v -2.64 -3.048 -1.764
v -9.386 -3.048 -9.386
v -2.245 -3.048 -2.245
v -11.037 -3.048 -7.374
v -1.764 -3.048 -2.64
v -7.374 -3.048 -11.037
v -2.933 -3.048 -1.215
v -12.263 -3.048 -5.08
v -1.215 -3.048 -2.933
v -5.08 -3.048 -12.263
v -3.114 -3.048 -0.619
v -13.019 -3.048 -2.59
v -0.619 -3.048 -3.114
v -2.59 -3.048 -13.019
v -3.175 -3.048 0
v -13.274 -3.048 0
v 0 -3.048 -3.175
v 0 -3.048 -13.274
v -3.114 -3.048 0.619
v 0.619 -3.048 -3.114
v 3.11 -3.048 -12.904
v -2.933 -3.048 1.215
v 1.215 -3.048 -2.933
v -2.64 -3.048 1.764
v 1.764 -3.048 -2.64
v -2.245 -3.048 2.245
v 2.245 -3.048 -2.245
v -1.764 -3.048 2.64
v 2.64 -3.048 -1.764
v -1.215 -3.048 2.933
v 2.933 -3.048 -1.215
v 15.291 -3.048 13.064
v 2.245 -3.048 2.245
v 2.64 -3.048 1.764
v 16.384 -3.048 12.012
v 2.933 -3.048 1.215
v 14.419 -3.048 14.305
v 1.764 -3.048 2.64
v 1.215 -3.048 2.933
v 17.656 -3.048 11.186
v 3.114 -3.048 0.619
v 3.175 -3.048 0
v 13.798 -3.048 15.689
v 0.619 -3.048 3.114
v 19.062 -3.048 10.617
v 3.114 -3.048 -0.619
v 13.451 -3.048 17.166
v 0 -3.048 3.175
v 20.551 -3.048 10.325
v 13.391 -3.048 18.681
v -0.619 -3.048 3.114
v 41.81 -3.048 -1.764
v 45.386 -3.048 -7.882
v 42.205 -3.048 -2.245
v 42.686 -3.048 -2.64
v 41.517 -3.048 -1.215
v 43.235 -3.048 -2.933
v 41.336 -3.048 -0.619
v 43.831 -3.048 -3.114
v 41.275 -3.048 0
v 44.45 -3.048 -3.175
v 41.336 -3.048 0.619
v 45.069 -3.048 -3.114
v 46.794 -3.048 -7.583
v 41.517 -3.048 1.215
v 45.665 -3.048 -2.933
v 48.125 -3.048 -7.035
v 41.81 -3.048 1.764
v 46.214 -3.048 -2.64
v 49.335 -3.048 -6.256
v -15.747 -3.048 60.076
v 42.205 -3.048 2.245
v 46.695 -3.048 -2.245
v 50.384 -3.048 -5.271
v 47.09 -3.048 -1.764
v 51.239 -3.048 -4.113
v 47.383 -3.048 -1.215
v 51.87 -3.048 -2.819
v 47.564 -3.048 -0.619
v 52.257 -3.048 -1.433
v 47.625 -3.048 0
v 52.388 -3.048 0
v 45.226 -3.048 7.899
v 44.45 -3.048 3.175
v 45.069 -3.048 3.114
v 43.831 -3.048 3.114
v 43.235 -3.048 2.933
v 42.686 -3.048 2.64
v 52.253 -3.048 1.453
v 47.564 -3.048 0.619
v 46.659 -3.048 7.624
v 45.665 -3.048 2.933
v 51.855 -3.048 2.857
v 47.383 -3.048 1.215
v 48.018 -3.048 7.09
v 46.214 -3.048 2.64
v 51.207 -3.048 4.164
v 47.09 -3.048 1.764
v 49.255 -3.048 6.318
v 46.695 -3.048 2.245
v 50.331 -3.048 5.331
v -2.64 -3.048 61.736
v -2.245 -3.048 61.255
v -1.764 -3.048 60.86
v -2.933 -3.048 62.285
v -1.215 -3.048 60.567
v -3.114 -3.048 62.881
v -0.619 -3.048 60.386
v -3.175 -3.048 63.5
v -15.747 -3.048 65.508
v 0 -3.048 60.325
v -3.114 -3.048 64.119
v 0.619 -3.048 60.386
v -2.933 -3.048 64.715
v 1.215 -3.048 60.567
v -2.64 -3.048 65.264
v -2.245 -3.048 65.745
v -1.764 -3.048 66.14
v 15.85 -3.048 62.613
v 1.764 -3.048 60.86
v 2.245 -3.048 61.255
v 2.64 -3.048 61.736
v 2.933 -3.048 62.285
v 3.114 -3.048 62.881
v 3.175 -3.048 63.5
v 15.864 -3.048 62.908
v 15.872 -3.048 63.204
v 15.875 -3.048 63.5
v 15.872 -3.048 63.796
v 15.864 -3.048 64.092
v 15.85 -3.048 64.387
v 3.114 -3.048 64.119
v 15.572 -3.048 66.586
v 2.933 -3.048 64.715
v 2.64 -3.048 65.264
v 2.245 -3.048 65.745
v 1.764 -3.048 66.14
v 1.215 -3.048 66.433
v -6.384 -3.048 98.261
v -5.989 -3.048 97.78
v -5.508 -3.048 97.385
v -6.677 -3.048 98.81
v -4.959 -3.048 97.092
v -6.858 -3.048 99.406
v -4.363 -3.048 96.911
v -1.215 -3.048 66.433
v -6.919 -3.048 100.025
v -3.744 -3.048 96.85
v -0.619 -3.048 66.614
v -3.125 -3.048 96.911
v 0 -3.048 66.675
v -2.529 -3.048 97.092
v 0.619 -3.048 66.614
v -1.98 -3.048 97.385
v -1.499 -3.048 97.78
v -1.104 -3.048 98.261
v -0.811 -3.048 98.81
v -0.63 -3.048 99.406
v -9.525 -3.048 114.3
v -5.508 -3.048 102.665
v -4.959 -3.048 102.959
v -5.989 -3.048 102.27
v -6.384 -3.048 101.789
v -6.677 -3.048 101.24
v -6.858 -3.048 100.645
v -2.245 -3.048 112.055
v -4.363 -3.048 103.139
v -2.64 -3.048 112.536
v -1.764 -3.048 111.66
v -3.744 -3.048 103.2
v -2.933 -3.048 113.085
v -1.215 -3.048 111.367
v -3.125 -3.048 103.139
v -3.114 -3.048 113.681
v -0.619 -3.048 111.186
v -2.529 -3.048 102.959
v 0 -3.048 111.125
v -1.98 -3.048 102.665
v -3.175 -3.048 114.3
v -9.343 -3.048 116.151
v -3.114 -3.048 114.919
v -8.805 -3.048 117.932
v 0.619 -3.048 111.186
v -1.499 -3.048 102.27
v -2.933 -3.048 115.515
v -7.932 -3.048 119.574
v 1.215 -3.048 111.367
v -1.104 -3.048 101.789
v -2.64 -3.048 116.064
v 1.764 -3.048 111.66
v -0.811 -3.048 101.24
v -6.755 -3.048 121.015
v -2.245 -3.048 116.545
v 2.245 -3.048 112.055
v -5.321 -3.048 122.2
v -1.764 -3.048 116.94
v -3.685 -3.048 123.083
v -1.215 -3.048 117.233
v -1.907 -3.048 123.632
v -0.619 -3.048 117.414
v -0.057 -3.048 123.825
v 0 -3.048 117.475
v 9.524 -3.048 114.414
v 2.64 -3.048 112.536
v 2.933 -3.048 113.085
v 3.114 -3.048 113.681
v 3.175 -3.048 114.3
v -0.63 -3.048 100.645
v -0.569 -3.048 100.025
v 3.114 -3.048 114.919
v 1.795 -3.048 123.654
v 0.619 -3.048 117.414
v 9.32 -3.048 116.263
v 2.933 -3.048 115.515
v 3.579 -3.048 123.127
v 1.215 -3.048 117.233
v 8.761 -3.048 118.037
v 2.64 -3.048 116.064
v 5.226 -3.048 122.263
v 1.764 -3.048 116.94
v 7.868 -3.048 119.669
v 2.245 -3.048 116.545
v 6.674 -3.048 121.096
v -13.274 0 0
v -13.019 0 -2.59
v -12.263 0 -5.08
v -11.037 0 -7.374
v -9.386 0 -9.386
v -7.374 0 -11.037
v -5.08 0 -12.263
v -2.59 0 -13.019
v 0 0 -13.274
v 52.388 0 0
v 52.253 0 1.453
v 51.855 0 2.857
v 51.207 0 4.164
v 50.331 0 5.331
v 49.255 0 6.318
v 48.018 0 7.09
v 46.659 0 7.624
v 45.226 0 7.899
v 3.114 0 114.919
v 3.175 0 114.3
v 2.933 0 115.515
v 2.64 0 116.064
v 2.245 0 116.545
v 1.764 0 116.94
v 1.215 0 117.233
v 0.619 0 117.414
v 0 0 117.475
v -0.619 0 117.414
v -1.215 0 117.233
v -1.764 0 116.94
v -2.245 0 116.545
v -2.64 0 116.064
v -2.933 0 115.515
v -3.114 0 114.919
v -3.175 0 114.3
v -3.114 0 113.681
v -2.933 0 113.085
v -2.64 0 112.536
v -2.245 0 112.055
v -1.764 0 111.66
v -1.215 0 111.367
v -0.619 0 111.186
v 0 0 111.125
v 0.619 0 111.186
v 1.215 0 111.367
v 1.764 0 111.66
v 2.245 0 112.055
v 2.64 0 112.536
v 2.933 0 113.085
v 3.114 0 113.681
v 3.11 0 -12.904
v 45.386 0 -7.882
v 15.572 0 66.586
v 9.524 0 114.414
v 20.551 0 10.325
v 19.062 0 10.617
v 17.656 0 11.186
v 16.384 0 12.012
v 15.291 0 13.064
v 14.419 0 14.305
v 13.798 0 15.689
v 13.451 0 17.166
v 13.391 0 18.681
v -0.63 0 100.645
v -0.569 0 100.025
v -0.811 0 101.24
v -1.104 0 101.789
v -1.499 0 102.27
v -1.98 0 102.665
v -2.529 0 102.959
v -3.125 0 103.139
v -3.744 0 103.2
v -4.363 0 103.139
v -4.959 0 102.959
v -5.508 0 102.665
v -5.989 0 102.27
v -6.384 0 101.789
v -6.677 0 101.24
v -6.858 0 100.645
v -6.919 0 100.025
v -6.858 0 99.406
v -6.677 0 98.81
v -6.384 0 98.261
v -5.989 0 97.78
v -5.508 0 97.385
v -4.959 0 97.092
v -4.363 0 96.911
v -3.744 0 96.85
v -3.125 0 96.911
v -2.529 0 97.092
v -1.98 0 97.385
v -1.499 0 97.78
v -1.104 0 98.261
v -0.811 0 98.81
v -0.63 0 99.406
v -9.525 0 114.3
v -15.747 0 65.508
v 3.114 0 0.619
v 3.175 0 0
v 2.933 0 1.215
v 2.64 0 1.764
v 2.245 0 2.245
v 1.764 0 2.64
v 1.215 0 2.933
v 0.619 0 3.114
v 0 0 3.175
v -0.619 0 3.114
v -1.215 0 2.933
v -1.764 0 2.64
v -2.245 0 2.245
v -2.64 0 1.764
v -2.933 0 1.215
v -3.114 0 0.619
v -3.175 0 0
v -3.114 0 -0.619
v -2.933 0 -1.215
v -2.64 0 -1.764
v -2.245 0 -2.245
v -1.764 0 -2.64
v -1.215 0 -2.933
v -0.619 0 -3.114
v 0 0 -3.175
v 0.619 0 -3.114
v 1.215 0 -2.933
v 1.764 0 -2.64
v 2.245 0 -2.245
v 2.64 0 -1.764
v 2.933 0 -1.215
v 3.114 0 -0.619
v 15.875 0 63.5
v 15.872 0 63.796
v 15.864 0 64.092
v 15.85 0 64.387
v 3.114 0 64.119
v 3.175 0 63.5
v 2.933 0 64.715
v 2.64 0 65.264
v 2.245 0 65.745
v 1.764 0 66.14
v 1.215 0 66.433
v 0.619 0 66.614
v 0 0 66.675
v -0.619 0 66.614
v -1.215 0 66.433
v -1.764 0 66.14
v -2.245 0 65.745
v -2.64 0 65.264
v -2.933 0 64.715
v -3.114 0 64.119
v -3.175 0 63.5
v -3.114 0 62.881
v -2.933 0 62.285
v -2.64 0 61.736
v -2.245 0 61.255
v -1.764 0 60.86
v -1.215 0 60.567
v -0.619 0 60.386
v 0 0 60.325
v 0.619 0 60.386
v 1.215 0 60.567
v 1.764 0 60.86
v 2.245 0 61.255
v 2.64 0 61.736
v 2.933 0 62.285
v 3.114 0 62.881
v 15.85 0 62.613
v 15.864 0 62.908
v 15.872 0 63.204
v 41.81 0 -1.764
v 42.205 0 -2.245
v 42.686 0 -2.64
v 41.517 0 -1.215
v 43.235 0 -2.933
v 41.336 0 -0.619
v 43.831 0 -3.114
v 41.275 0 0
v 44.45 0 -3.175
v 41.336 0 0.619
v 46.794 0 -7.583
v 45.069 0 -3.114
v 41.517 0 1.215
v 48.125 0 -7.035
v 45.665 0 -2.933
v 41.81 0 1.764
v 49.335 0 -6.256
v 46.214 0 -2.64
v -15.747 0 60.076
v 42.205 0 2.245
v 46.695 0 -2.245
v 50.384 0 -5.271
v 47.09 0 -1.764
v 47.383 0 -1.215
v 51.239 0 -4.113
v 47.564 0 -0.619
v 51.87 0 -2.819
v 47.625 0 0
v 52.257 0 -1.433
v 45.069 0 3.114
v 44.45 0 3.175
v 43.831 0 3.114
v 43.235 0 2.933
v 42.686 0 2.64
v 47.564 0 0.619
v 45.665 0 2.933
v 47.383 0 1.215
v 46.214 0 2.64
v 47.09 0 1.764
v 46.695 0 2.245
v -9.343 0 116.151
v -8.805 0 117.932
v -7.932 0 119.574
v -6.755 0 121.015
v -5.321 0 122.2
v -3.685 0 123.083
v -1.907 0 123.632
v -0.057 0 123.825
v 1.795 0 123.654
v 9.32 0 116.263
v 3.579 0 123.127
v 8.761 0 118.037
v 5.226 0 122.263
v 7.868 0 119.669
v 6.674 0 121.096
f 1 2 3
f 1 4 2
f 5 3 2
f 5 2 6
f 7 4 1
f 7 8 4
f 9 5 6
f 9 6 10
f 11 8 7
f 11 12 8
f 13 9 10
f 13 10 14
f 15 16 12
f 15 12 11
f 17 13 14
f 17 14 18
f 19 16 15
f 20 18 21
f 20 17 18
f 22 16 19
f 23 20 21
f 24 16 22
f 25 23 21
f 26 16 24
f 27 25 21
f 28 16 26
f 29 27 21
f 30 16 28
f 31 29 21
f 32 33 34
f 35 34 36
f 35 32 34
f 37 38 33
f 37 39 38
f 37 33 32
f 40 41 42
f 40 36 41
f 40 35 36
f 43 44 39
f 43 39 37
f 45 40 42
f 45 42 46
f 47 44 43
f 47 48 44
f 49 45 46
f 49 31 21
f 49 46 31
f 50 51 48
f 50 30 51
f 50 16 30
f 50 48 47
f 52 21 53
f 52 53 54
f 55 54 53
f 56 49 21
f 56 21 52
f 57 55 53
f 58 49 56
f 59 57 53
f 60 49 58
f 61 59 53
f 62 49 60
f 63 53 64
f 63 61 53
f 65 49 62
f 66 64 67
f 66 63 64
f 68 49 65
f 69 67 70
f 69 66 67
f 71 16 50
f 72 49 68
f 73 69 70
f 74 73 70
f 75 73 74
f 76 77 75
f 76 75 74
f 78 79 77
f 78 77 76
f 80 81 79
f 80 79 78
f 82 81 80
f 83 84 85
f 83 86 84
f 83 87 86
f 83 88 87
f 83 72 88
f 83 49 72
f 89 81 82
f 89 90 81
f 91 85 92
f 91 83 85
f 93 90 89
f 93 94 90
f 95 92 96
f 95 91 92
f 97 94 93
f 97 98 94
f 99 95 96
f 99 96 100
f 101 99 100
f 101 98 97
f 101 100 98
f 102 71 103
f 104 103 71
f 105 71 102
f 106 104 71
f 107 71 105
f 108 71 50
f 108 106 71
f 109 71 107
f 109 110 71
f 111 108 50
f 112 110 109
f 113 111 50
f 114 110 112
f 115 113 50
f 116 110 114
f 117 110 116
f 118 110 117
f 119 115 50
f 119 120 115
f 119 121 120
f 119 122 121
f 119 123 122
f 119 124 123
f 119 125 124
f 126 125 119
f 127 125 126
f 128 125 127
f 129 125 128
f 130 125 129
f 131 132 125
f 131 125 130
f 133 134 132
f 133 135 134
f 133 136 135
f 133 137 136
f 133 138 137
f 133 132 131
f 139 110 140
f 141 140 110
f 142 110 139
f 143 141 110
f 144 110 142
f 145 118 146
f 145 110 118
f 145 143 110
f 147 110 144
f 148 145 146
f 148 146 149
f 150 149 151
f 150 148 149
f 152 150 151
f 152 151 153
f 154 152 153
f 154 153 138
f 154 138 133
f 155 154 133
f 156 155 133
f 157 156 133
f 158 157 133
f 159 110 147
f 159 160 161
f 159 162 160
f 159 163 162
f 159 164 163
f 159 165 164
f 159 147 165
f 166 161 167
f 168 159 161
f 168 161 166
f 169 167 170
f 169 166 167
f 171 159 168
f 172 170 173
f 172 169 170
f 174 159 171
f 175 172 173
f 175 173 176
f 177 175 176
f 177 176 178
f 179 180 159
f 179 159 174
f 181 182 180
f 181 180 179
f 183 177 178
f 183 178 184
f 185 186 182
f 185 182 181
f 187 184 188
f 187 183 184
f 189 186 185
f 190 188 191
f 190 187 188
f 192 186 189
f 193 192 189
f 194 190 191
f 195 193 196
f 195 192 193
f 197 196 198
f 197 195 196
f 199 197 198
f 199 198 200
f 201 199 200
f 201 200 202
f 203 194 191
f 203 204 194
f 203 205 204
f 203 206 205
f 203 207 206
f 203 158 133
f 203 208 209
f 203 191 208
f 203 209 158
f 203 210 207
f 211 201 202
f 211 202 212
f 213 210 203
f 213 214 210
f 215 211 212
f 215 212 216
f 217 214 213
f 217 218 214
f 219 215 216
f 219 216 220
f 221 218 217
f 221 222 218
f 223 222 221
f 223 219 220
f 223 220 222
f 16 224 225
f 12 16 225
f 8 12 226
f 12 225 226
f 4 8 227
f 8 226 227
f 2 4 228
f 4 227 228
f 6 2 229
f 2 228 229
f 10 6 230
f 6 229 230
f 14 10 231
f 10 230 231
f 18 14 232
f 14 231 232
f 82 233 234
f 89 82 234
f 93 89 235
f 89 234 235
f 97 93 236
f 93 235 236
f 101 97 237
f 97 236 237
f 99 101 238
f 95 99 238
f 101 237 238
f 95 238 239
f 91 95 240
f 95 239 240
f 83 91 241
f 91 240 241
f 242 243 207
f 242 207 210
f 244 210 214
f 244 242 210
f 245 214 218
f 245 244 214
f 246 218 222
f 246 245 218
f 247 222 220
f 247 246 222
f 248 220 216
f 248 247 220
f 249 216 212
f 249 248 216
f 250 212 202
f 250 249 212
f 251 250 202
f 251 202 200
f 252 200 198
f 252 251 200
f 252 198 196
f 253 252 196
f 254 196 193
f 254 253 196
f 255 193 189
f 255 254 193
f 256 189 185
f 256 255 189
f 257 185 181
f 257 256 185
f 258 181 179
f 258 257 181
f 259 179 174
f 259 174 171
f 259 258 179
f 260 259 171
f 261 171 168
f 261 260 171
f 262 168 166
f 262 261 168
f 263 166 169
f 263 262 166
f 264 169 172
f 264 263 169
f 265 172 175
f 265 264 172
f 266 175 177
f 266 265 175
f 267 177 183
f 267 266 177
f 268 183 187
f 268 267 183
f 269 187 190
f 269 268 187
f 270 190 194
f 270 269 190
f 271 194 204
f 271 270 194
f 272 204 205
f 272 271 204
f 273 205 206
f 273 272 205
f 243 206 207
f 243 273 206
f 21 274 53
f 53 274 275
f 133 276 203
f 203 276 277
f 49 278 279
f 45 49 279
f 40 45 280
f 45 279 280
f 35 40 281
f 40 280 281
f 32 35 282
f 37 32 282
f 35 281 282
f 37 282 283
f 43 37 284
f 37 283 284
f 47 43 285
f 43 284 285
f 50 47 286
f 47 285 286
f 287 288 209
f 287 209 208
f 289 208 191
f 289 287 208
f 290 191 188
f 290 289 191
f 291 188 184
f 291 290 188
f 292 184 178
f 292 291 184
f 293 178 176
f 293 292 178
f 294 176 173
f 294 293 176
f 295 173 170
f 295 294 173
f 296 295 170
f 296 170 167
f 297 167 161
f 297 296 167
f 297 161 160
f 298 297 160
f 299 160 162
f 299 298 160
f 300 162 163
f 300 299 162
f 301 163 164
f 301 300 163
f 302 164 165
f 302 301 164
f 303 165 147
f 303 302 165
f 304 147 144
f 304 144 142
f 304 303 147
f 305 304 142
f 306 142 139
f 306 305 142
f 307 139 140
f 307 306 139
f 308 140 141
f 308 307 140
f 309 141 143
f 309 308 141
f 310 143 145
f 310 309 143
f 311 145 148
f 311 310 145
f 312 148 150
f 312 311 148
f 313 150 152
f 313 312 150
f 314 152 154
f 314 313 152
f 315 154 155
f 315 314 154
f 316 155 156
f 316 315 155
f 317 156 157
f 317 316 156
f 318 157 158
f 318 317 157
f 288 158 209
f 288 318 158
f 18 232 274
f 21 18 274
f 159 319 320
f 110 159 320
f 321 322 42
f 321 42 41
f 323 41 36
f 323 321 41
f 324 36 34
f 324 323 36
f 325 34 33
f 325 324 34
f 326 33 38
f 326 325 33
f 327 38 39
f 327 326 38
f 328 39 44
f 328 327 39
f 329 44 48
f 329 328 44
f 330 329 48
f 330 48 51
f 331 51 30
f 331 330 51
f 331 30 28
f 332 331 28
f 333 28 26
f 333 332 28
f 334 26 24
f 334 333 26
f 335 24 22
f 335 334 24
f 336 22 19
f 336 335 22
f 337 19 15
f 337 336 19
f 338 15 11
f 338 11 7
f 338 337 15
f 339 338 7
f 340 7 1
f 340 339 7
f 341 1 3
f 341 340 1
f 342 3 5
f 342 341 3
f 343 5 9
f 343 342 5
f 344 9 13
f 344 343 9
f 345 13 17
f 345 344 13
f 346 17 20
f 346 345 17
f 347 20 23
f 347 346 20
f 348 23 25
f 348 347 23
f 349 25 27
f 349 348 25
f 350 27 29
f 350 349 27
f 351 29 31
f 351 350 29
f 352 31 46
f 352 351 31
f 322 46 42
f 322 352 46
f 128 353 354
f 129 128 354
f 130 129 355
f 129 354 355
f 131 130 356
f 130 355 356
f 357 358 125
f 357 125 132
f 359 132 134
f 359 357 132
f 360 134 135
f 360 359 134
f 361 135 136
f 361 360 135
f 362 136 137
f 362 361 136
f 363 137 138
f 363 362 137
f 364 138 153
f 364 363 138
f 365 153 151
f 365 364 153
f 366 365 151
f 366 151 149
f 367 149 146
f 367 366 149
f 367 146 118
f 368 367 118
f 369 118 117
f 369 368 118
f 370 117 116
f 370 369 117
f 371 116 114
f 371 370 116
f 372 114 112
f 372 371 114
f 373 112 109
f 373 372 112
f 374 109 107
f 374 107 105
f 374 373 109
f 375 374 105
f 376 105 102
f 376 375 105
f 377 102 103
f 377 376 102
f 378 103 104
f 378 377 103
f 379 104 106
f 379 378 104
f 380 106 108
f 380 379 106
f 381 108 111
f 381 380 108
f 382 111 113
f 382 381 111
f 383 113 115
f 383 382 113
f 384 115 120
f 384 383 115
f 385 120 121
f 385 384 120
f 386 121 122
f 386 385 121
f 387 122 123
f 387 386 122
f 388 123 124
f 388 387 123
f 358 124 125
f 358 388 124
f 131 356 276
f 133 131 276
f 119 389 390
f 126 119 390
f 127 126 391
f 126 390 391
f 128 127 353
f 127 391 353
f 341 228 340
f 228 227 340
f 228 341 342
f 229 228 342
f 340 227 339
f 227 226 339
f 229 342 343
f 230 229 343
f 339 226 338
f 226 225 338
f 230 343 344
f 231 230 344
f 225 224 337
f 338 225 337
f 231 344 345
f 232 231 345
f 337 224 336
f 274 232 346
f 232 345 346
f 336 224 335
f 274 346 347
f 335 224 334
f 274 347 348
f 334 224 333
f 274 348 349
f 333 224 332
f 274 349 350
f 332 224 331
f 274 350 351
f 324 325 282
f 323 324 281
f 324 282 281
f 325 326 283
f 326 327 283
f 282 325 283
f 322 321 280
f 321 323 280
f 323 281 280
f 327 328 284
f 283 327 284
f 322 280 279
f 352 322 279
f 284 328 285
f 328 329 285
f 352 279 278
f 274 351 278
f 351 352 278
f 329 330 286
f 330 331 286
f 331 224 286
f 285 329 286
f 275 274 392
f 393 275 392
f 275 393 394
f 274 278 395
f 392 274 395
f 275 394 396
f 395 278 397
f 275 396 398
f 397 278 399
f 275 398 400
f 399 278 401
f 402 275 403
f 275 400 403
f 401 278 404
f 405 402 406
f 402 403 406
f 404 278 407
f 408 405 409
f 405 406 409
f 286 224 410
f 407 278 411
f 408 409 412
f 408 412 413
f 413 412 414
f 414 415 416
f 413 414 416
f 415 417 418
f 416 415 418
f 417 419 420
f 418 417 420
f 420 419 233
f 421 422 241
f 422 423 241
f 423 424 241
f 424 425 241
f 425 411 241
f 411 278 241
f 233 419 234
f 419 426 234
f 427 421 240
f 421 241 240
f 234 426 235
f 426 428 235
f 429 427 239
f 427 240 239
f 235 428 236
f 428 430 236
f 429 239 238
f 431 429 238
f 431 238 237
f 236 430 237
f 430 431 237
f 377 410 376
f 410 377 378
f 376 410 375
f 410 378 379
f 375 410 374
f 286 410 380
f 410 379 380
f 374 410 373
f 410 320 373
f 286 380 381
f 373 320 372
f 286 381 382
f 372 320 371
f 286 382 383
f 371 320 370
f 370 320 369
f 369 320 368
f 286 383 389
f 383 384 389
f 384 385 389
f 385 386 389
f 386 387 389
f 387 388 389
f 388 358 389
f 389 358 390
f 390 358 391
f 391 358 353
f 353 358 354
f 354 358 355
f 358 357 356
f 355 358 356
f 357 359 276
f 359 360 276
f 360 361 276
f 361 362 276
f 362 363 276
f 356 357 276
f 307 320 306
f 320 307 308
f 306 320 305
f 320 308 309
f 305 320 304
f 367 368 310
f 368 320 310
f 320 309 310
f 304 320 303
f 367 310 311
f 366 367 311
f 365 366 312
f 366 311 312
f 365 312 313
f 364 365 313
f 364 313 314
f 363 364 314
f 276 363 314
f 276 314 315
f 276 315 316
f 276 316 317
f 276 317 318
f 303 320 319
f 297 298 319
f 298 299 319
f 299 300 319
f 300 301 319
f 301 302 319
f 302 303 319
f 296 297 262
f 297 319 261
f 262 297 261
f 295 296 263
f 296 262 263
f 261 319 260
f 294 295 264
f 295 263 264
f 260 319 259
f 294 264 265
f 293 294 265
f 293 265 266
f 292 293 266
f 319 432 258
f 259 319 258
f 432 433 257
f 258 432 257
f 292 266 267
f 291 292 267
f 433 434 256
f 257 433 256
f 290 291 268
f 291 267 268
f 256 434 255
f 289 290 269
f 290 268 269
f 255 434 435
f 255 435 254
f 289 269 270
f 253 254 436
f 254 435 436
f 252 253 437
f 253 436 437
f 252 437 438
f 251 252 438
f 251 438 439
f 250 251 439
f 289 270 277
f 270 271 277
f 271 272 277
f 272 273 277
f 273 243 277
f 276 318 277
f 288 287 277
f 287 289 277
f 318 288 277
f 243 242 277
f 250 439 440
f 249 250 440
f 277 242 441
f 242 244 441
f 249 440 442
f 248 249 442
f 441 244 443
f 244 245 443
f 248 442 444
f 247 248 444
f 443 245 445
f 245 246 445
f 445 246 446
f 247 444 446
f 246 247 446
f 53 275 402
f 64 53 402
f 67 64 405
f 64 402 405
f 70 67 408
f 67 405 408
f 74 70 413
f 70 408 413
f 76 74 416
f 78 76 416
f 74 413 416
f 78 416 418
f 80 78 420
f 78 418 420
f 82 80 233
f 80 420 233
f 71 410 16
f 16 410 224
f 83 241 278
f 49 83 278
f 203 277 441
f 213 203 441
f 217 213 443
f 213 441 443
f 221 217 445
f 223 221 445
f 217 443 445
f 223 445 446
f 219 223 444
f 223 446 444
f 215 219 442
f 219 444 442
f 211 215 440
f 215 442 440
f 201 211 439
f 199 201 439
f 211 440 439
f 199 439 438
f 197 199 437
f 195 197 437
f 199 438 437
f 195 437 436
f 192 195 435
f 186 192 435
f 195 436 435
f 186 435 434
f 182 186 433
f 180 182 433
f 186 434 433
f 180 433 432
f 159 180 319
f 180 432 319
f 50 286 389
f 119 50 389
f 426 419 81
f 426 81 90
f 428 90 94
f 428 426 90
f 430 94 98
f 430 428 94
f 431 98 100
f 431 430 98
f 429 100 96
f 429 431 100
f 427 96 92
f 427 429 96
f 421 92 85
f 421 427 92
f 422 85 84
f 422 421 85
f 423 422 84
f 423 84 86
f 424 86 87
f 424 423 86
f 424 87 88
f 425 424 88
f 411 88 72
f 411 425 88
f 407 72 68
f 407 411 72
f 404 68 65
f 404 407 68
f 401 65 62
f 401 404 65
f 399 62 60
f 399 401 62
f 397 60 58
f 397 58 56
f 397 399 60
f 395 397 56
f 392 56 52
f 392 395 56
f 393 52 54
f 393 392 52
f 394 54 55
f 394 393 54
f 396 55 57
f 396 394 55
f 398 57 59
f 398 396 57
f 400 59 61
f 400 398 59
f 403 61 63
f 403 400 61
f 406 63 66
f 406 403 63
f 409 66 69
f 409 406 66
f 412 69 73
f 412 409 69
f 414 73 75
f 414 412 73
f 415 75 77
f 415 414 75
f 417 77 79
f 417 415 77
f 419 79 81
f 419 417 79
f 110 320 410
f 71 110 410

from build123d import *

# Parameters (mm, degrees)
F0_R     = 3.175
F1_DEPTH = 3.048


with BuildPart() as f1:
    # F0 (on Front) → F1 (new body)
    with BuildSketch(Plane.XZ):
        with BuildLine():
            ThreePointArc((3.1097588161, -12.904249902), (10.427563759, -8.2131710978), (13.2736681226, 0))
            ThreePointArc((13.2736681226, 0), (0, 13.2736681226), (-13.2736681226, 0))
            ThreePointArc((-13.2736681226, 0), (-9.3859007407, -9.3859007407), (0, -13.2736681226))
            Line((0, -13.2736681226), (3.1097588161, -12.904249902))
        make_face()
        Circle(F0_R, mode=Mode.SUBTRACT)
        with BuildLine():
            ThreePointArc((-13.2736681226, 0), (0, 13.2736681226), (13.2736681226, 0))
            ThreePointArc((13.2736681226, 0), (10.427563759, -8.2131710978), (3.1097588161, -12.904249902))
            Line((3.1097588161, -12.904249902), (45.3863375042, -7.8820795688))
            ThreePointArc((45.3863375042, -7.8820795688), (36.5129073275, -0.0804124208), (45.2264515588, 7.8994322091))
            Line((45.2264515588, 7.8994322091), (20.5507771811, 10.3248553698))
            ThreePointArc((20.5507771811, 10.3248553698), (15.2912984453, 13.0640911975), (13.39070093, 18.6813199251))
            Line((13.39070093, 18.6813199251), (15.8501799769, 62.6126332776))
            ThreePointArc((15.8501799769, 62.6126332776), (0.5628098086, 47.6349796685), (-15.7474569047, 61.4917106696))
            Line((-15.7474569047, 61.4917106696), (-15.7474569047, 60.0759088993))
            Line((-15.7474569047, 60.0759088993), (-13.2736681226, 0))
        make_face()
        with BuildLine():
            ThreePointArc((45.2264515588, 7.8994322091), (36.5129073275, -0.0804124208), (45.3863375042, -7.8820795688))
            ThreePointArc((45.3863375042, -7.8820795688), (50.3844791342, -5.2712298048), (52.3875, 0))
            ThreePointArc((52.3875, 0), (50.3307733547, 5.3310797219), (45.2264515588, 7.8994322091))
        make_face()
        with Locations((44.45, 0)):
            Circle(F0_R, mode=Mode.SUBTRACT)
        with BuildLine():
            Line((-15.7474569047, 65.5082893304), (-15.7474569047, 61.4917106696))
            ThreePointArc((-15.7474569047, 61.4917106696), (0.5628098086, 47.6349796685), (15.8501799769, 62.6126332776))
            ThreePointArc((15.8501799769, 62.6126332776), (15.8687937811, 63.0561431161), (15.875, 63.5))
            ThreePointArc((15.875, 63.5), (15.8687937811, 63.9438568839), (15.8501799769, 64.3873667224))
            Line((15.8501799769, 64.3873667224), (15.5721686032, 66.5859666221))
            ThreePointArc((15.5721686032, 66.5859666221), (-0.5459199423, 79.3656104962), (-15.7474569047, 65.5082893304))
        make_face()
        with Locations((0, 63.5)):
            Circle(F0_R, mode=Mode.SUBTRACT)
        with BuildLine():
            Line((-9.525, 114.3), (-15.7474569047, 65.5082893304))
            ThreePointArc((-15.7474569047, 65.5082893304), (-0.5459199423, 79.3656104962), (15.5721686032, 66.5859666221))
            Line((15.5721686032, 66.5859666221), (9.5243145818, 114.4142661242))
            ThreePointArc((9.5243145818, 114.4142661242), (9.5248286439, 114.3571340899), (9.525, 114.3))
            ThreePointArc((9.525, 114.3), (0, 104.775), (-9.525, 114.3))
        make_face()
        with Locations((-3.7440145388, 100.0252)):
            Circle(F0_R, mode=Mode.SUBTRACT)
        with BuildLine():
            ThreePointArc((9.5243145818, 114.4142661242), (-0.0571340899, 123.8248286439), (-9.525, 114.3))
            ThreePointArc((-9.525, 114.3), (0, 104.775), (9.525, 114.3))
            ThreePointArc((9.525, 114.3), (9.5248286439, 114.3571340899), (9.5243145818, 114.4142661242))
        make_face()
        with Locations((0, 114.3)):
            Circle(F0_R, mode=Mode.SUBTRACT)
    extrude(amount=F1_DEPTH)


solid = f1.part
